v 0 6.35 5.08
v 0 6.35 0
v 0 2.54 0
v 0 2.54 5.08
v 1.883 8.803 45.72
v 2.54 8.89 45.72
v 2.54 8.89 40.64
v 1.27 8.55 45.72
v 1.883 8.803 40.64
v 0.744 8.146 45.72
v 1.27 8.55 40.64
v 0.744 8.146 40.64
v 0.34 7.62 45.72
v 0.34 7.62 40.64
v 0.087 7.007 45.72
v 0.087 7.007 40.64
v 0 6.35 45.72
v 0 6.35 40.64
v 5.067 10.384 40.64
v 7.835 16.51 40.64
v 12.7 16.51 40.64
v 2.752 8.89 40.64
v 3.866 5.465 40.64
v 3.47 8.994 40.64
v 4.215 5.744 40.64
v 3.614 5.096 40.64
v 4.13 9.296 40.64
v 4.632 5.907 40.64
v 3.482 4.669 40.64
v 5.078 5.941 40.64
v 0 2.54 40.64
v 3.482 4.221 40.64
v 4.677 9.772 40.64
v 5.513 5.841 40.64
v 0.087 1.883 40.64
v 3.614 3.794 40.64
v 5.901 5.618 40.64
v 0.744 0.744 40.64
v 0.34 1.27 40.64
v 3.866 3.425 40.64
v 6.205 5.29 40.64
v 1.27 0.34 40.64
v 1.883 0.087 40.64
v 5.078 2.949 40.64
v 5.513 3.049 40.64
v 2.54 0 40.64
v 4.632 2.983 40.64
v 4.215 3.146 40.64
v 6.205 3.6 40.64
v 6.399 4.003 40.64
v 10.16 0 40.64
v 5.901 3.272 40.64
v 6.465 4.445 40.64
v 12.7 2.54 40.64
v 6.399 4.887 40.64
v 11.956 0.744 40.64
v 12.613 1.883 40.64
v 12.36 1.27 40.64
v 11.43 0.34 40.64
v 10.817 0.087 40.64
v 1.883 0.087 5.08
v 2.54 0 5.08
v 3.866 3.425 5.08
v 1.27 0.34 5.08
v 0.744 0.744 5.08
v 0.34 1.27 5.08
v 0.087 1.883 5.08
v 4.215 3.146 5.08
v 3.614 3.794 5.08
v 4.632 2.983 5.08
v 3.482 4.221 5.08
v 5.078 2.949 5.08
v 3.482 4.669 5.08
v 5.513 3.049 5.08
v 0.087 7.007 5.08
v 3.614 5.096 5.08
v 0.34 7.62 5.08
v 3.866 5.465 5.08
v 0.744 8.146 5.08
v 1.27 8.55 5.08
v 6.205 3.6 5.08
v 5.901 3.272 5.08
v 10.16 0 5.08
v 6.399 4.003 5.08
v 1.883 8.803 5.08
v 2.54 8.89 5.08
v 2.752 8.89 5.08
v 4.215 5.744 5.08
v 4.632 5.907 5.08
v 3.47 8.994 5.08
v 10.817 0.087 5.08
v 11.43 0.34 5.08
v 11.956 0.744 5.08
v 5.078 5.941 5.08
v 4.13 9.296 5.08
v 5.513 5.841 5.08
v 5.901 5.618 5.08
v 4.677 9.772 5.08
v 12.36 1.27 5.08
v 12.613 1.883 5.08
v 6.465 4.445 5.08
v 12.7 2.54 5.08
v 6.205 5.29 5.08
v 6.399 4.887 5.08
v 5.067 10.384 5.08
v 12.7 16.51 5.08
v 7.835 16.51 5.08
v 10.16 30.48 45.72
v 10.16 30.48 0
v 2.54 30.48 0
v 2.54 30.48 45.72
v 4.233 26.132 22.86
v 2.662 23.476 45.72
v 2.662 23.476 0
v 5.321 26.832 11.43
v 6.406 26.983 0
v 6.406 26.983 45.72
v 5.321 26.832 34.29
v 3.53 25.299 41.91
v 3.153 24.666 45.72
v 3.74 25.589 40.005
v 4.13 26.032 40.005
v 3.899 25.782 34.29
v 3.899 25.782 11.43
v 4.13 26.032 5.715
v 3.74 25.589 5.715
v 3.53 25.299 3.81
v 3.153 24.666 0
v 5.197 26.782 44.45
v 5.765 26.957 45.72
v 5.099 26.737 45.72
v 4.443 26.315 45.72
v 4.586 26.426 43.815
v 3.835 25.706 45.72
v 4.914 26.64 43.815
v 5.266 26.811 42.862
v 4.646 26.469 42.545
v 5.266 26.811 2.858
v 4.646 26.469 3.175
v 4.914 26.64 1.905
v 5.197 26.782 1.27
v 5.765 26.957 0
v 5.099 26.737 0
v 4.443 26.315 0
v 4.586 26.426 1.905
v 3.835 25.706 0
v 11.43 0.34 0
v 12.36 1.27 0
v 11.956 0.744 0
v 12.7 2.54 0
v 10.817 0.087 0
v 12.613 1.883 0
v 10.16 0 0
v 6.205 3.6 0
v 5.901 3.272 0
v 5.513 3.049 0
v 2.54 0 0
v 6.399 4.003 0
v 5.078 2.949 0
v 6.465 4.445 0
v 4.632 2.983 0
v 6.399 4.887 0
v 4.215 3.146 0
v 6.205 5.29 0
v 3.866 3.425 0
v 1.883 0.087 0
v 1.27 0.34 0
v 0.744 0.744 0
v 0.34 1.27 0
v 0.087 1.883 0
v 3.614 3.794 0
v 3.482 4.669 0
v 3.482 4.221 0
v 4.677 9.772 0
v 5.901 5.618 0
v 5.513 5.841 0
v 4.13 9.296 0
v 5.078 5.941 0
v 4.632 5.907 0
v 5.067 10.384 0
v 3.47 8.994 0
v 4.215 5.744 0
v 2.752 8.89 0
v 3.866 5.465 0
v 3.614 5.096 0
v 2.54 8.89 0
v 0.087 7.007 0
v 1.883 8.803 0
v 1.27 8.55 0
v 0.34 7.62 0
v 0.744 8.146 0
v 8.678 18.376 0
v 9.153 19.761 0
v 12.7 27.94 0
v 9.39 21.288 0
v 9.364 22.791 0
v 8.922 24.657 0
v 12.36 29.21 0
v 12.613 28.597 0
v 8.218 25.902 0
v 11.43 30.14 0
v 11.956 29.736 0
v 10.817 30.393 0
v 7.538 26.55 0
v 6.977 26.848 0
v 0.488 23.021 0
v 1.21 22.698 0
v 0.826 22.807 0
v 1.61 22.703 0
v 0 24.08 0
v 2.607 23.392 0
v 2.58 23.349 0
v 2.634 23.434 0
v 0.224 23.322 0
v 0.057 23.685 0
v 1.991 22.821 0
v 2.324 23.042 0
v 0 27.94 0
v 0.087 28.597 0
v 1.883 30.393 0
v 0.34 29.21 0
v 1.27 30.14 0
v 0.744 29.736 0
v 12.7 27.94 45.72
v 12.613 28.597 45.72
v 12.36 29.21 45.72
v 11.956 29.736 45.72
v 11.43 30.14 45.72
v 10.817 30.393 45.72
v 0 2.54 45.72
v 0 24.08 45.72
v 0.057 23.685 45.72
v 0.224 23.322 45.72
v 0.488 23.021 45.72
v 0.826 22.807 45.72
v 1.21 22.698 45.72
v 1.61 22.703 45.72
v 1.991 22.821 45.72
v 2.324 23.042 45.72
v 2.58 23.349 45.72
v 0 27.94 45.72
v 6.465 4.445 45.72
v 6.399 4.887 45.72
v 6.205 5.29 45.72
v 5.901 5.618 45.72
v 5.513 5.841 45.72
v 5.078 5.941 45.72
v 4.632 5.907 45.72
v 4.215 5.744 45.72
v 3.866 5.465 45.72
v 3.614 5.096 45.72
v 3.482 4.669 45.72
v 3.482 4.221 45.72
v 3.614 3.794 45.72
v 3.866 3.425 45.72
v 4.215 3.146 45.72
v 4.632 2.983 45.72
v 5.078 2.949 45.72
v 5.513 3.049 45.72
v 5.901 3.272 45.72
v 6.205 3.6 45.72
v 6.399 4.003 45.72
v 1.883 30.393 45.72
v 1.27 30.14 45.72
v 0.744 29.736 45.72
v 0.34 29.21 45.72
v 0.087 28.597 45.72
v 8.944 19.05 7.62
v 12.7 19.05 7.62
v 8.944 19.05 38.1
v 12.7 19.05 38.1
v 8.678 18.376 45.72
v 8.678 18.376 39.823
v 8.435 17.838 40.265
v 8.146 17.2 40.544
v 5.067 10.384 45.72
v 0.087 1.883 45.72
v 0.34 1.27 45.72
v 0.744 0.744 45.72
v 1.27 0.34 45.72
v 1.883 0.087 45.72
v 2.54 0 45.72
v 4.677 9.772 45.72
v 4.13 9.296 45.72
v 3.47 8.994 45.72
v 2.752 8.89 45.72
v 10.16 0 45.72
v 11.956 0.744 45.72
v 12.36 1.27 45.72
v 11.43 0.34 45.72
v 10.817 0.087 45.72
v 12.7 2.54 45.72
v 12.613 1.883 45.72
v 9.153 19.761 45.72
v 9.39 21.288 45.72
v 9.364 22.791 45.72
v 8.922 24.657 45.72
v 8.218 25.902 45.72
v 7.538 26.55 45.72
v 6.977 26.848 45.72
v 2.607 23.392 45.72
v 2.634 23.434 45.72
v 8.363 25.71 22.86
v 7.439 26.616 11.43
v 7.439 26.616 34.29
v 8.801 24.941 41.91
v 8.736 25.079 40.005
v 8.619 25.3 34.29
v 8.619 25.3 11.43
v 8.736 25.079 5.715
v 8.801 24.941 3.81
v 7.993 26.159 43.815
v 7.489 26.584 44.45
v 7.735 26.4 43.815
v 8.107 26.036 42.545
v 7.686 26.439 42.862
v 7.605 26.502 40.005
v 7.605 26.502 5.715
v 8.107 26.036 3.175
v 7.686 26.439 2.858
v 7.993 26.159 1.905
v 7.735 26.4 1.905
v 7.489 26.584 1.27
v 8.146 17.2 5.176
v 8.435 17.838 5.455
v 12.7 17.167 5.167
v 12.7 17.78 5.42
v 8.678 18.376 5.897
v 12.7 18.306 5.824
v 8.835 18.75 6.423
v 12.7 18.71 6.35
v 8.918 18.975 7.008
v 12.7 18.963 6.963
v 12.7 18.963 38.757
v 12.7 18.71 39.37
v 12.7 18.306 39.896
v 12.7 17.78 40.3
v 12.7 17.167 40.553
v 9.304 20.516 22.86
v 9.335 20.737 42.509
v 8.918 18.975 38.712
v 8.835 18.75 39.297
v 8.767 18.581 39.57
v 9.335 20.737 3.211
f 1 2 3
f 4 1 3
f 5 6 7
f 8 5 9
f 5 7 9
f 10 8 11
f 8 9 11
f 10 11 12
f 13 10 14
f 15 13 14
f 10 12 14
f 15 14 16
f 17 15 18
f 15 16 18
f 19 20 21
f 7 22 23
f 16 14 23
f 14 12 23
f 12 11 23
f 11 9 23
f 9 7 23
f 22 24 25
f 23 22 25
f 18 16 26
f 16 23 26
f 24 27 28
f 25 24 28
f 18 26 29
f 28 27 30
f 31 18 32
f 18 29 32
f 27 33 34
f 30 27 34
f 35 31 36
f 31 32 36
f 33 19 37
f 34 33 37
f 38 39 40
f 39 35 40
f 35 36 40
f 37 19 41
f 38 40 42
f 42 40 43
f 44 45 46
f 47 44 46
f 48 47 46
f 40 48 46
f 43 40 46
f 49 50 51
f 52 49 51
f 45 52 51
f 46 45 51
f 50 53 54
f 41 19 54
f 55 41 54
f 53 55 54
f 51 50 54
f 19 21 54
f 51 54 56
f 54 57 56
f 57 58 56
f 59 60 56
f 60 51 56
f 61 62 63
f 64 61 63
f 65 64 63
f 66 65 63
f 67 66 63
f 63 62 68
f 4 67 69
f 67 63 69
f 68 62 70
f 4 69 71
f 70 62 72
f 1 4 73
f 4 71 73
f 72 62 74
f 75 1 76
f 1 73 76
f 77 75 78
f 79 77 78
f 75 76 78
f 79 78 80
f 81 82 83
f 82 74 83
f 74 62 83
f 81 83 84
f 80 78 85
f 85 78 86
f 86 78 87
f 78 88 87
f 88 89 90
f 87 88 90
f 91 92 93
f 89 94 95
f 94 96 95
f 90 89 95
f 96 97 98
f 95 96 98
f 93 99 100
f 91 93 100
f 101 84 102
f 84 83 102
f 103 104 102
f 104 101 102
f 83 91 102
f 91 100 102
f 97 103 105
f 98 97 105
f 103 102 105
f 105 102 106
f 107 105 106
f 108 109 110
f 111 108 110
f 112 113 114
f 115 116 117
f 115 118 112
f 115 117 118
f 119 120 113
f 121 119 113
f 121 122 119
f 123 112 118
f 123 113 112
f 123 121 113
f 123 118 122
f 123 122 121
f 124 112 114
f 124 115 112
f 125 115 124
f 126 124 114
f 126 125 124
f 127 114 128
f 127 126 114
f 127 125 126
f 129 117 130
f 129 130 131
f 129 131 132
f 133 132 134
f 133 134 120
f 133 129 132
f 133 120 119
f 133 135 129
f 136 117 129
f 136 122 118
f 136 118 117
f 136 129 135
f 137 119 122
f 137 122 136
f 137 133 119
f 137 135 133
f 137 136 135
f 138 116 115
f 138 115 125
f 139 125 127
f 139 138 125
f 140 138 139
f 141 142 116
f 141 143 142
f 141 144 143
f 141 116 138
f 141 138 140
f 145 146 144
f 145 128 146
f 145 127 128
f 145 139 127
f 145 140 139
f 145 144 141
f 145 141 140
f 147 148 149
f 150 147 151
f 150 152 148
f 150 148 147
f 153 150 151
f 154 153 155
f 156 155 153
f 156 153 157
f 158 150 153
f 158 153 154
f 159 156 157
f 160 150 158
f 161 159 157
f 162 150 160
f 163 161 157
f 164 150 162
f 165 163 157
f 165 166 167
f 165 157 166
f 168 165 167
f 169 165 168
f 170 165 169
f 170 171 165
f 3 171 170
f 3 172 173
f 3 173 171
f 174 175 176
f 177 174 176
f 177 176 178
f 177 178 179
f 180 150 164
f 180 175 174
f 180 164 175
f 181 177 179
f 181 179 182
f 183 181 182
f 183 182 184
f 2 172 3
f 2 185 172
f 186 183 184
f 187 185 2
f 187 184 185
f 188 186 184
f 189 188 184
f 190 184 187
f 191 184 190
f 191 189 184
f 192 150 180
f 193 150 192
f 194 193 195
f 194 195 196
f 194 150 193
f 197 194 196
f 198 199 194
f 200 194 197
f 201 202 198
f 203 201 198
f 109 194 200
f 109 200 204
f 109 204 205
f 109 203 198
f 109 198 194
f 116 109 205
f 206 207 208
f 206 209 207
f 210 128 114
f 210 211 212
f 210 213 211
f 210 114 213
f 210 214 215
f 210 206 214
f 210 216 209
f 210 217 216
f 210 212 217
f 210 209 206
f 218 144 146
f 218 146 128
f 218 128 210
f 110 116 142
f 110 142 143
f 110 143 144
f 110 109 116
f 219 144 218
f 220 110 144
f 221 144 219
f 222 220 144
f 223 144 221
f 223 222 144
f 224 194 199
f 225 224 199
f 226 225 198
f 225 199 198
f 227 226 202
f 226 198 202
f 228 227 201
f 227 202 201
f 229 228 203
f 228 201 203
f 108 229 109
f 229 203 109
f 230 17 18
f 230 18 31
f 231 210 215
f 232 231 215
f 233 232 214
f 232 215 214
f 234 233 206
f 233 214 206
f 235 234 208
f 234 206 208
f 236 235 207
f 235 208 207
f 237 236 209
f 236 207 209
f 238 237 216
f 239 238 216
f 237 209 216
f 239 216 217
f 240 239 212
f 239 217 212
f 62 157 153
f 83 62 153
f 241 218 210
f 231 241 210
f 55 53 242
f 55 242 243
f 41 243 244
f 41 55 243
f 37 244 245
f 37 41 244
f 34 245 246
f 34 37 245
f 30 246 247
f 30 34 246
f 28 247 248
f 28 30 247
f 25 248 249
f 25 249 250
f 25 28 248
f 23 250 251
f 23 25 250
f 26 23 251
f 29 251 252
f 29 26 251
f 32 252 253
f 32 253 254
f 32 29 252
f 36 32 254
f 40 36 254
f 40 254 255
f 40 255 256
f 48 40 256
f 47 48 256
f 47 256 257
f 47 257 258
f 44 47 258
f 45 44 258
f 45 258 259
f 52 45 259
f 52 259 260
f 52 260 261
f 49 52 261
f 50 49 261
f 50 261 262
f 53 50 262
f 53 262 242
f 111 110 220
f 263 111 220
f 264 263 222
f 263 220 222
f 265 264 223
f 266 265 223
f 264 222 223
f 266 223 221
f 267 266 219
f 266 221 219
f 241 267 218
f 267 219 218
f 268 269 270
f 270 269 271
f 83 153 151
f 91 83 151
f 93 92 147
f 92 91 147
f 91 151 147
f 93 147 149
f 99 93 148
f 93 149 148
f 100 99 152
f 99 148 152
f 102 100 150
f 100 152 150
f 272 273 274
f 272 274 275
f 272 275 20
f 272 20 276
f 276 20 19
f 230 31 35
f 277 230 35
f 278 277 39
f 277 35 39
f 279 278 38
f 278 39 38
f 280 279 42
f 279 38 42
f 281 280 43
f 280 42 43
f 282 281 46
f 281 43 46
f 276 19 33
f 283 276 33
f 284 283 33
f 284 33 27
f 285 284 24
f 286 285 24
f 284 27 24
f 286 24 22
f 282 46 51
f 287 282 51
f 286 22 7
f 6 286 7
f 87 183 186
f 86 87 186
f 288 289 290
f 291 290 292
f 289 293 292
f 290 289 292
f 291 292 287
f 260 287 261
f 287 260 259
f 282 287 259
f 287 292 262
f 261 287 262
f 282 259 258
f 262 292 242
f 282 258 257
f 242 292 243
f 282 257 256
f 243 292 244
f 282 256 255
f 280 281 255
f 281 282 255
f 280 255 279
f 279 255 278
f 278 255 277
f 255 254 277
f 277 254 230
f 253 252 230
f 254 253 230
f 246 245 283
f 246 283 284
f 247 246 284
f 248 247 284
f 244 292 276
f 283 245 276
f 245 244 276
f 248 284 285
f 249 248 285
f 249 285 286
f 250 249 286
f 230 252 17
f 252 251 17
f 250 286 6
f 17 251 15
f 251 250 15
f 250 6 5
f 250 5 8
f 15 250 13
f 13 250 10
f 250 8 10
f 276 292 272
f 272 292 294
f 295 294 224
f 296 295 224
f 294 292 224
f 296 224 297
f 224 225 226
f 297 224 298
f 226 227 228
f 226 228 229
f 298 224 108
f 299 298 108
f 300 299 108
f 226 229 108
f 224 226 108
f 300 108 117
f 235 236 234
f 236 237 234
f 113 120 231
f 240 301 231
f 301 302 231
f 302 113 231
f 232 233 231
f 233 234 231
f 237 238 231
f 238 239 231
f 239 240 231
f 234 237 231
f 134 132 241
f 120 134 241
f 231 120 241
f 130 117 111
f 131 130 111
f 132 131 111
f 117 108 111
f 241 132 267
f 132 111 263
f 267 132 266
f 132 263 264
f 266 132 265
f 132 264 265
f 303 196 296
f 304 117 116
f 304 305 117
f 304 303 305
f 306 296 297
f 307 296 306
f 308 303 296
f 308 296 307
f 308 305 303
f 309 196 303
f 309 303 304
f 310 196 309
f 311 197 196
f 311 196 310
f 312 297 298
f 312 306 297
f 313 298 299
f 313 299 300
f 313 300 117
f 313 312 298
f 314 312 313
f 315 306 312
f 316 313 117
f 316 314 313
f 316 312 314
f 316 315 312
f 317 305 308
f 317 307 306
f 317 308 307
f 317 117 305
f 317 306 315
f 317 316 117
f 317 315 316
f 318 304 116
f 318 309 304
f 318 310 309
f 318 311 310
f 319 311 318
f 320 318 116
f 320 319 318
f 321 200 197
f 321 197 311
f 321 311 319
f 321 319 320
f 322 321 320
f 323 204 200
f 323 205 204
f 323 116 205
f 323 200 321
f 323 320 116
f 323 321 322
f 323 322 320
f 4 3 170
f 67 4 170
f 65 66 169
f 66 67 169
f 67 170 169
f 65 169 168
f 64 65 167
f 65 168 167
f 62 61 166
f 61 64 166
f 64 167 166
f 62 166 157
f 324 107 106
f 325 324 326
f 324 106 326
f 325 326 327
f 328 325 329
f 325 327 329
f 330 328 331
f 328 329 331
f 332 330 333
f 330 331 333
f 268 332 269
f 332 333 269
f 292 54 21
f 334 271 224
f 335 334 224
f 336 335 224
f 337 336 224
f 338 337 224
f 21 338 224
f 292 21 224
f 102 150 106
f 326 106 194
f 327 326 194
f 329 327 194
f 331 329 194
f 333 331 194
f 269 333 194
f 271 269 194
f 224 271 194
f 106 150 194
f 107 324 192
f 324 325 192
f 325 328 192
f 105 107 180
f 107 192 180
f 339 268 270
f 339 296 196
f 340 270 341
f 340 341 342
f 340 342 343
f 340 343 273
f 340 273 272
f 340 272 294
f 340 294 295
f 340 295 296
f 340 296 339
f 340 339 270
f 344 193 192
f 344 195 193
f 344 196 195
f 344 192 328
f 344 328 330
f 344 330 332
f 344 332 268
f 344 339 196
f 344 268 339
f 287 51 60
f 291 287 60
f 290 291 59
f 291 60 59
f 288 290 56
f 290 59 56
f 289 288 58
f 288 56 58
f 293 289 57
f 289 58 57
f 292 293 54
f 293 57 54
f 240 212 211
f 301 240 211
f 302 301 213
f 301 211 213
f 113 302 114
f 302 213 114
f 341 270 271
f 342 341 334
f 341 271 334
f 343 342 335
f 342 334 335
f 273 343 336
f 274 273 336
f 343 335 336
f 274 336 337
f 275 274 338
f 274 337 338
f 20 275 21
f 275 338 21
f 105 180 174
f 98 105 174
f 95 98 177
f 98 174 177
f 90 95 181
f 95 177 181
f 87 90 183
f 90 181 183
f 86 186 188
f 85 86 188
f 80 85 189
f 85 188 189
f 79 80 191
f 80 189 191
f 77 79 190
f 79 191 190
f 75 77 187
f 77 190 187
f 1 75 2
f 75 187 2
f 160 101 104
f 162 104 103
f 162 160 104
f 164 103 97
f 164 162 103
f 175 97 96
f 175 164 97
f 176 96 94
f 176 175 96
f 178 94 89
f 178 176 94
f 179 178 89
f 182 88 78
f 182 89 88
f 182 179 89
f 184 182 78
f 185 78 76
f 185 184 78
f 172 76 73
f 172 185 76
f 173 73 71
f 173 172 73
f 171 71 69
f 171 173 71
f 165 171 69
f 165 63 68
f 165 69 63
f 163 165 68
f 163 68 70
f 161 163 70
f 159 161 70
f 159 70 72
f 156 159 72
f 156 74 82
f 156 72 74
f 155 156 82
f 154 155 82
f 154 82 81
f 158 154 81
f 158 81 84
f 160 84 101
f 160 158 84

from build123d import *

# Parameters (mm, degrees)
SKETCH1_R           = 1.5
BOSS_EXTRUDE1_DEPTH = 45.72
CUT_EXTRUDE1_DEPTH  = 25.4


with BuildPart() as part:
    # Sketch1 → Boss-Extrude1 (new body)
    with BuildSketch(Plane.XY):
        with BuildLine():
            add(Edge.make_bspline(
                [(8.677884321, 18.376352753), (9.611503438, 20.442753269), (9.364466551, 22.79145978)],
                knots=[4.222526815, 4.222526815, 4.222526815, 5.034979768, 5.034979768, 5.034979768], degree=2, weights=[1, 0.918618451, 1]))
            Line((8.677884321, 18.376352753), (5.066951203, 10.384192012))
            ThreePointArc((5.066951203, 10.384192012), (4.129783184, 9.29599528), (2.752240497, 8.89))
            Line((2.752240497, 8.89), (2.54, 8.89))
            ThreePointArc((2.54, 8.89), (0.743948776, 8.146051224), (0, 6.35))
            Line((0, 6.35), (0, 2.54))
            ThreePointArc((0, 2.54), (0.743948776, 0.743948776), (2.54, 0))
            Line((2.54, 0), (10.16, 0))
            ThreePointArc((10.16, 0), (11.956051224, 0.743948776), (12.7, 2.54))
            Line((12.7, 2.54), (12.7, 27.94))
            ThreePointArc((12.7, 27.94), (11.956051224, 29.736051224), (10.16, 30.48))
            Line((10.16, 30.48), (2.54, 30.48))
            ThreePointArc((2.54, 30.48), (0.743948776, 29.736051224), (0, 27.94))
            Line((0, 27.94), (0, 24.08))
            ThreePointArc((0, 24.08), (1.01383309, 22.739069096), (2.58032425, 23.349035215))
            ThreePointArc((2.58032425, 23.349035215), (2.620527336, 23.41287828), (2.661984223, 23.475914394))
            add(Edge.make_bspline(
                [(6.406345811, 26.98329616), (3.861791417, 27.243144961), (2.661984223, 23.475914394)],
                knots=[0, 0, 0, 1.248205539, 1.248205539, 1.248205539], degree=2, weights=[1, 0.81148776, 1]))
            add(Edge.make_bspline(
                [(9.364466551, 22.79145978), (8.950900204, 26.723447359), (6.406345811, 26.98329616)],
                knots=[5.034979768, 5.034979768, 5.034979768, 6.283185307, 6.283185307, 6.283185307], degree=2, weights=[1, 0.81148776, 1]))
        make_face()
        with Locations((4.965459901, 4.445)):
            Circle(SKETCH1_R, mode=Mode.SUBTRACT)
    extrude(amount=BOSS_EXTRUDE1_DEPTH)

    # Sketch2 → Cut-Extrude1 (cut)
    with BuildSketch(Plane(origin=(12.7, 0, 0), x_dir=(0, 0, -1), z_dir=(1, 0, 0))):
        with BuildLine():
            Line((-40.64, 0), (-5.08, 0))
            Line((-5.08, 0), (-5.08, 16.51))
            ThreePointArc((-5.08, 16.51), (-5.823948776, 18.306051224), (-7.62, 19.05))
            Line((-7.62, 19.05), (-38.1, 19.05))
            ThreePointArc((-38.1, 19.05), (-39.896051224, 18.306051224), (-40.64, 16.51))
            Line((-40.64, 16.51), (-40.64, 0))
        make_face()
    extrude(amount=-CUT_EXTRUDE1_DEPTH, mode=Mode.SUBTRACT)


solid = part.part
